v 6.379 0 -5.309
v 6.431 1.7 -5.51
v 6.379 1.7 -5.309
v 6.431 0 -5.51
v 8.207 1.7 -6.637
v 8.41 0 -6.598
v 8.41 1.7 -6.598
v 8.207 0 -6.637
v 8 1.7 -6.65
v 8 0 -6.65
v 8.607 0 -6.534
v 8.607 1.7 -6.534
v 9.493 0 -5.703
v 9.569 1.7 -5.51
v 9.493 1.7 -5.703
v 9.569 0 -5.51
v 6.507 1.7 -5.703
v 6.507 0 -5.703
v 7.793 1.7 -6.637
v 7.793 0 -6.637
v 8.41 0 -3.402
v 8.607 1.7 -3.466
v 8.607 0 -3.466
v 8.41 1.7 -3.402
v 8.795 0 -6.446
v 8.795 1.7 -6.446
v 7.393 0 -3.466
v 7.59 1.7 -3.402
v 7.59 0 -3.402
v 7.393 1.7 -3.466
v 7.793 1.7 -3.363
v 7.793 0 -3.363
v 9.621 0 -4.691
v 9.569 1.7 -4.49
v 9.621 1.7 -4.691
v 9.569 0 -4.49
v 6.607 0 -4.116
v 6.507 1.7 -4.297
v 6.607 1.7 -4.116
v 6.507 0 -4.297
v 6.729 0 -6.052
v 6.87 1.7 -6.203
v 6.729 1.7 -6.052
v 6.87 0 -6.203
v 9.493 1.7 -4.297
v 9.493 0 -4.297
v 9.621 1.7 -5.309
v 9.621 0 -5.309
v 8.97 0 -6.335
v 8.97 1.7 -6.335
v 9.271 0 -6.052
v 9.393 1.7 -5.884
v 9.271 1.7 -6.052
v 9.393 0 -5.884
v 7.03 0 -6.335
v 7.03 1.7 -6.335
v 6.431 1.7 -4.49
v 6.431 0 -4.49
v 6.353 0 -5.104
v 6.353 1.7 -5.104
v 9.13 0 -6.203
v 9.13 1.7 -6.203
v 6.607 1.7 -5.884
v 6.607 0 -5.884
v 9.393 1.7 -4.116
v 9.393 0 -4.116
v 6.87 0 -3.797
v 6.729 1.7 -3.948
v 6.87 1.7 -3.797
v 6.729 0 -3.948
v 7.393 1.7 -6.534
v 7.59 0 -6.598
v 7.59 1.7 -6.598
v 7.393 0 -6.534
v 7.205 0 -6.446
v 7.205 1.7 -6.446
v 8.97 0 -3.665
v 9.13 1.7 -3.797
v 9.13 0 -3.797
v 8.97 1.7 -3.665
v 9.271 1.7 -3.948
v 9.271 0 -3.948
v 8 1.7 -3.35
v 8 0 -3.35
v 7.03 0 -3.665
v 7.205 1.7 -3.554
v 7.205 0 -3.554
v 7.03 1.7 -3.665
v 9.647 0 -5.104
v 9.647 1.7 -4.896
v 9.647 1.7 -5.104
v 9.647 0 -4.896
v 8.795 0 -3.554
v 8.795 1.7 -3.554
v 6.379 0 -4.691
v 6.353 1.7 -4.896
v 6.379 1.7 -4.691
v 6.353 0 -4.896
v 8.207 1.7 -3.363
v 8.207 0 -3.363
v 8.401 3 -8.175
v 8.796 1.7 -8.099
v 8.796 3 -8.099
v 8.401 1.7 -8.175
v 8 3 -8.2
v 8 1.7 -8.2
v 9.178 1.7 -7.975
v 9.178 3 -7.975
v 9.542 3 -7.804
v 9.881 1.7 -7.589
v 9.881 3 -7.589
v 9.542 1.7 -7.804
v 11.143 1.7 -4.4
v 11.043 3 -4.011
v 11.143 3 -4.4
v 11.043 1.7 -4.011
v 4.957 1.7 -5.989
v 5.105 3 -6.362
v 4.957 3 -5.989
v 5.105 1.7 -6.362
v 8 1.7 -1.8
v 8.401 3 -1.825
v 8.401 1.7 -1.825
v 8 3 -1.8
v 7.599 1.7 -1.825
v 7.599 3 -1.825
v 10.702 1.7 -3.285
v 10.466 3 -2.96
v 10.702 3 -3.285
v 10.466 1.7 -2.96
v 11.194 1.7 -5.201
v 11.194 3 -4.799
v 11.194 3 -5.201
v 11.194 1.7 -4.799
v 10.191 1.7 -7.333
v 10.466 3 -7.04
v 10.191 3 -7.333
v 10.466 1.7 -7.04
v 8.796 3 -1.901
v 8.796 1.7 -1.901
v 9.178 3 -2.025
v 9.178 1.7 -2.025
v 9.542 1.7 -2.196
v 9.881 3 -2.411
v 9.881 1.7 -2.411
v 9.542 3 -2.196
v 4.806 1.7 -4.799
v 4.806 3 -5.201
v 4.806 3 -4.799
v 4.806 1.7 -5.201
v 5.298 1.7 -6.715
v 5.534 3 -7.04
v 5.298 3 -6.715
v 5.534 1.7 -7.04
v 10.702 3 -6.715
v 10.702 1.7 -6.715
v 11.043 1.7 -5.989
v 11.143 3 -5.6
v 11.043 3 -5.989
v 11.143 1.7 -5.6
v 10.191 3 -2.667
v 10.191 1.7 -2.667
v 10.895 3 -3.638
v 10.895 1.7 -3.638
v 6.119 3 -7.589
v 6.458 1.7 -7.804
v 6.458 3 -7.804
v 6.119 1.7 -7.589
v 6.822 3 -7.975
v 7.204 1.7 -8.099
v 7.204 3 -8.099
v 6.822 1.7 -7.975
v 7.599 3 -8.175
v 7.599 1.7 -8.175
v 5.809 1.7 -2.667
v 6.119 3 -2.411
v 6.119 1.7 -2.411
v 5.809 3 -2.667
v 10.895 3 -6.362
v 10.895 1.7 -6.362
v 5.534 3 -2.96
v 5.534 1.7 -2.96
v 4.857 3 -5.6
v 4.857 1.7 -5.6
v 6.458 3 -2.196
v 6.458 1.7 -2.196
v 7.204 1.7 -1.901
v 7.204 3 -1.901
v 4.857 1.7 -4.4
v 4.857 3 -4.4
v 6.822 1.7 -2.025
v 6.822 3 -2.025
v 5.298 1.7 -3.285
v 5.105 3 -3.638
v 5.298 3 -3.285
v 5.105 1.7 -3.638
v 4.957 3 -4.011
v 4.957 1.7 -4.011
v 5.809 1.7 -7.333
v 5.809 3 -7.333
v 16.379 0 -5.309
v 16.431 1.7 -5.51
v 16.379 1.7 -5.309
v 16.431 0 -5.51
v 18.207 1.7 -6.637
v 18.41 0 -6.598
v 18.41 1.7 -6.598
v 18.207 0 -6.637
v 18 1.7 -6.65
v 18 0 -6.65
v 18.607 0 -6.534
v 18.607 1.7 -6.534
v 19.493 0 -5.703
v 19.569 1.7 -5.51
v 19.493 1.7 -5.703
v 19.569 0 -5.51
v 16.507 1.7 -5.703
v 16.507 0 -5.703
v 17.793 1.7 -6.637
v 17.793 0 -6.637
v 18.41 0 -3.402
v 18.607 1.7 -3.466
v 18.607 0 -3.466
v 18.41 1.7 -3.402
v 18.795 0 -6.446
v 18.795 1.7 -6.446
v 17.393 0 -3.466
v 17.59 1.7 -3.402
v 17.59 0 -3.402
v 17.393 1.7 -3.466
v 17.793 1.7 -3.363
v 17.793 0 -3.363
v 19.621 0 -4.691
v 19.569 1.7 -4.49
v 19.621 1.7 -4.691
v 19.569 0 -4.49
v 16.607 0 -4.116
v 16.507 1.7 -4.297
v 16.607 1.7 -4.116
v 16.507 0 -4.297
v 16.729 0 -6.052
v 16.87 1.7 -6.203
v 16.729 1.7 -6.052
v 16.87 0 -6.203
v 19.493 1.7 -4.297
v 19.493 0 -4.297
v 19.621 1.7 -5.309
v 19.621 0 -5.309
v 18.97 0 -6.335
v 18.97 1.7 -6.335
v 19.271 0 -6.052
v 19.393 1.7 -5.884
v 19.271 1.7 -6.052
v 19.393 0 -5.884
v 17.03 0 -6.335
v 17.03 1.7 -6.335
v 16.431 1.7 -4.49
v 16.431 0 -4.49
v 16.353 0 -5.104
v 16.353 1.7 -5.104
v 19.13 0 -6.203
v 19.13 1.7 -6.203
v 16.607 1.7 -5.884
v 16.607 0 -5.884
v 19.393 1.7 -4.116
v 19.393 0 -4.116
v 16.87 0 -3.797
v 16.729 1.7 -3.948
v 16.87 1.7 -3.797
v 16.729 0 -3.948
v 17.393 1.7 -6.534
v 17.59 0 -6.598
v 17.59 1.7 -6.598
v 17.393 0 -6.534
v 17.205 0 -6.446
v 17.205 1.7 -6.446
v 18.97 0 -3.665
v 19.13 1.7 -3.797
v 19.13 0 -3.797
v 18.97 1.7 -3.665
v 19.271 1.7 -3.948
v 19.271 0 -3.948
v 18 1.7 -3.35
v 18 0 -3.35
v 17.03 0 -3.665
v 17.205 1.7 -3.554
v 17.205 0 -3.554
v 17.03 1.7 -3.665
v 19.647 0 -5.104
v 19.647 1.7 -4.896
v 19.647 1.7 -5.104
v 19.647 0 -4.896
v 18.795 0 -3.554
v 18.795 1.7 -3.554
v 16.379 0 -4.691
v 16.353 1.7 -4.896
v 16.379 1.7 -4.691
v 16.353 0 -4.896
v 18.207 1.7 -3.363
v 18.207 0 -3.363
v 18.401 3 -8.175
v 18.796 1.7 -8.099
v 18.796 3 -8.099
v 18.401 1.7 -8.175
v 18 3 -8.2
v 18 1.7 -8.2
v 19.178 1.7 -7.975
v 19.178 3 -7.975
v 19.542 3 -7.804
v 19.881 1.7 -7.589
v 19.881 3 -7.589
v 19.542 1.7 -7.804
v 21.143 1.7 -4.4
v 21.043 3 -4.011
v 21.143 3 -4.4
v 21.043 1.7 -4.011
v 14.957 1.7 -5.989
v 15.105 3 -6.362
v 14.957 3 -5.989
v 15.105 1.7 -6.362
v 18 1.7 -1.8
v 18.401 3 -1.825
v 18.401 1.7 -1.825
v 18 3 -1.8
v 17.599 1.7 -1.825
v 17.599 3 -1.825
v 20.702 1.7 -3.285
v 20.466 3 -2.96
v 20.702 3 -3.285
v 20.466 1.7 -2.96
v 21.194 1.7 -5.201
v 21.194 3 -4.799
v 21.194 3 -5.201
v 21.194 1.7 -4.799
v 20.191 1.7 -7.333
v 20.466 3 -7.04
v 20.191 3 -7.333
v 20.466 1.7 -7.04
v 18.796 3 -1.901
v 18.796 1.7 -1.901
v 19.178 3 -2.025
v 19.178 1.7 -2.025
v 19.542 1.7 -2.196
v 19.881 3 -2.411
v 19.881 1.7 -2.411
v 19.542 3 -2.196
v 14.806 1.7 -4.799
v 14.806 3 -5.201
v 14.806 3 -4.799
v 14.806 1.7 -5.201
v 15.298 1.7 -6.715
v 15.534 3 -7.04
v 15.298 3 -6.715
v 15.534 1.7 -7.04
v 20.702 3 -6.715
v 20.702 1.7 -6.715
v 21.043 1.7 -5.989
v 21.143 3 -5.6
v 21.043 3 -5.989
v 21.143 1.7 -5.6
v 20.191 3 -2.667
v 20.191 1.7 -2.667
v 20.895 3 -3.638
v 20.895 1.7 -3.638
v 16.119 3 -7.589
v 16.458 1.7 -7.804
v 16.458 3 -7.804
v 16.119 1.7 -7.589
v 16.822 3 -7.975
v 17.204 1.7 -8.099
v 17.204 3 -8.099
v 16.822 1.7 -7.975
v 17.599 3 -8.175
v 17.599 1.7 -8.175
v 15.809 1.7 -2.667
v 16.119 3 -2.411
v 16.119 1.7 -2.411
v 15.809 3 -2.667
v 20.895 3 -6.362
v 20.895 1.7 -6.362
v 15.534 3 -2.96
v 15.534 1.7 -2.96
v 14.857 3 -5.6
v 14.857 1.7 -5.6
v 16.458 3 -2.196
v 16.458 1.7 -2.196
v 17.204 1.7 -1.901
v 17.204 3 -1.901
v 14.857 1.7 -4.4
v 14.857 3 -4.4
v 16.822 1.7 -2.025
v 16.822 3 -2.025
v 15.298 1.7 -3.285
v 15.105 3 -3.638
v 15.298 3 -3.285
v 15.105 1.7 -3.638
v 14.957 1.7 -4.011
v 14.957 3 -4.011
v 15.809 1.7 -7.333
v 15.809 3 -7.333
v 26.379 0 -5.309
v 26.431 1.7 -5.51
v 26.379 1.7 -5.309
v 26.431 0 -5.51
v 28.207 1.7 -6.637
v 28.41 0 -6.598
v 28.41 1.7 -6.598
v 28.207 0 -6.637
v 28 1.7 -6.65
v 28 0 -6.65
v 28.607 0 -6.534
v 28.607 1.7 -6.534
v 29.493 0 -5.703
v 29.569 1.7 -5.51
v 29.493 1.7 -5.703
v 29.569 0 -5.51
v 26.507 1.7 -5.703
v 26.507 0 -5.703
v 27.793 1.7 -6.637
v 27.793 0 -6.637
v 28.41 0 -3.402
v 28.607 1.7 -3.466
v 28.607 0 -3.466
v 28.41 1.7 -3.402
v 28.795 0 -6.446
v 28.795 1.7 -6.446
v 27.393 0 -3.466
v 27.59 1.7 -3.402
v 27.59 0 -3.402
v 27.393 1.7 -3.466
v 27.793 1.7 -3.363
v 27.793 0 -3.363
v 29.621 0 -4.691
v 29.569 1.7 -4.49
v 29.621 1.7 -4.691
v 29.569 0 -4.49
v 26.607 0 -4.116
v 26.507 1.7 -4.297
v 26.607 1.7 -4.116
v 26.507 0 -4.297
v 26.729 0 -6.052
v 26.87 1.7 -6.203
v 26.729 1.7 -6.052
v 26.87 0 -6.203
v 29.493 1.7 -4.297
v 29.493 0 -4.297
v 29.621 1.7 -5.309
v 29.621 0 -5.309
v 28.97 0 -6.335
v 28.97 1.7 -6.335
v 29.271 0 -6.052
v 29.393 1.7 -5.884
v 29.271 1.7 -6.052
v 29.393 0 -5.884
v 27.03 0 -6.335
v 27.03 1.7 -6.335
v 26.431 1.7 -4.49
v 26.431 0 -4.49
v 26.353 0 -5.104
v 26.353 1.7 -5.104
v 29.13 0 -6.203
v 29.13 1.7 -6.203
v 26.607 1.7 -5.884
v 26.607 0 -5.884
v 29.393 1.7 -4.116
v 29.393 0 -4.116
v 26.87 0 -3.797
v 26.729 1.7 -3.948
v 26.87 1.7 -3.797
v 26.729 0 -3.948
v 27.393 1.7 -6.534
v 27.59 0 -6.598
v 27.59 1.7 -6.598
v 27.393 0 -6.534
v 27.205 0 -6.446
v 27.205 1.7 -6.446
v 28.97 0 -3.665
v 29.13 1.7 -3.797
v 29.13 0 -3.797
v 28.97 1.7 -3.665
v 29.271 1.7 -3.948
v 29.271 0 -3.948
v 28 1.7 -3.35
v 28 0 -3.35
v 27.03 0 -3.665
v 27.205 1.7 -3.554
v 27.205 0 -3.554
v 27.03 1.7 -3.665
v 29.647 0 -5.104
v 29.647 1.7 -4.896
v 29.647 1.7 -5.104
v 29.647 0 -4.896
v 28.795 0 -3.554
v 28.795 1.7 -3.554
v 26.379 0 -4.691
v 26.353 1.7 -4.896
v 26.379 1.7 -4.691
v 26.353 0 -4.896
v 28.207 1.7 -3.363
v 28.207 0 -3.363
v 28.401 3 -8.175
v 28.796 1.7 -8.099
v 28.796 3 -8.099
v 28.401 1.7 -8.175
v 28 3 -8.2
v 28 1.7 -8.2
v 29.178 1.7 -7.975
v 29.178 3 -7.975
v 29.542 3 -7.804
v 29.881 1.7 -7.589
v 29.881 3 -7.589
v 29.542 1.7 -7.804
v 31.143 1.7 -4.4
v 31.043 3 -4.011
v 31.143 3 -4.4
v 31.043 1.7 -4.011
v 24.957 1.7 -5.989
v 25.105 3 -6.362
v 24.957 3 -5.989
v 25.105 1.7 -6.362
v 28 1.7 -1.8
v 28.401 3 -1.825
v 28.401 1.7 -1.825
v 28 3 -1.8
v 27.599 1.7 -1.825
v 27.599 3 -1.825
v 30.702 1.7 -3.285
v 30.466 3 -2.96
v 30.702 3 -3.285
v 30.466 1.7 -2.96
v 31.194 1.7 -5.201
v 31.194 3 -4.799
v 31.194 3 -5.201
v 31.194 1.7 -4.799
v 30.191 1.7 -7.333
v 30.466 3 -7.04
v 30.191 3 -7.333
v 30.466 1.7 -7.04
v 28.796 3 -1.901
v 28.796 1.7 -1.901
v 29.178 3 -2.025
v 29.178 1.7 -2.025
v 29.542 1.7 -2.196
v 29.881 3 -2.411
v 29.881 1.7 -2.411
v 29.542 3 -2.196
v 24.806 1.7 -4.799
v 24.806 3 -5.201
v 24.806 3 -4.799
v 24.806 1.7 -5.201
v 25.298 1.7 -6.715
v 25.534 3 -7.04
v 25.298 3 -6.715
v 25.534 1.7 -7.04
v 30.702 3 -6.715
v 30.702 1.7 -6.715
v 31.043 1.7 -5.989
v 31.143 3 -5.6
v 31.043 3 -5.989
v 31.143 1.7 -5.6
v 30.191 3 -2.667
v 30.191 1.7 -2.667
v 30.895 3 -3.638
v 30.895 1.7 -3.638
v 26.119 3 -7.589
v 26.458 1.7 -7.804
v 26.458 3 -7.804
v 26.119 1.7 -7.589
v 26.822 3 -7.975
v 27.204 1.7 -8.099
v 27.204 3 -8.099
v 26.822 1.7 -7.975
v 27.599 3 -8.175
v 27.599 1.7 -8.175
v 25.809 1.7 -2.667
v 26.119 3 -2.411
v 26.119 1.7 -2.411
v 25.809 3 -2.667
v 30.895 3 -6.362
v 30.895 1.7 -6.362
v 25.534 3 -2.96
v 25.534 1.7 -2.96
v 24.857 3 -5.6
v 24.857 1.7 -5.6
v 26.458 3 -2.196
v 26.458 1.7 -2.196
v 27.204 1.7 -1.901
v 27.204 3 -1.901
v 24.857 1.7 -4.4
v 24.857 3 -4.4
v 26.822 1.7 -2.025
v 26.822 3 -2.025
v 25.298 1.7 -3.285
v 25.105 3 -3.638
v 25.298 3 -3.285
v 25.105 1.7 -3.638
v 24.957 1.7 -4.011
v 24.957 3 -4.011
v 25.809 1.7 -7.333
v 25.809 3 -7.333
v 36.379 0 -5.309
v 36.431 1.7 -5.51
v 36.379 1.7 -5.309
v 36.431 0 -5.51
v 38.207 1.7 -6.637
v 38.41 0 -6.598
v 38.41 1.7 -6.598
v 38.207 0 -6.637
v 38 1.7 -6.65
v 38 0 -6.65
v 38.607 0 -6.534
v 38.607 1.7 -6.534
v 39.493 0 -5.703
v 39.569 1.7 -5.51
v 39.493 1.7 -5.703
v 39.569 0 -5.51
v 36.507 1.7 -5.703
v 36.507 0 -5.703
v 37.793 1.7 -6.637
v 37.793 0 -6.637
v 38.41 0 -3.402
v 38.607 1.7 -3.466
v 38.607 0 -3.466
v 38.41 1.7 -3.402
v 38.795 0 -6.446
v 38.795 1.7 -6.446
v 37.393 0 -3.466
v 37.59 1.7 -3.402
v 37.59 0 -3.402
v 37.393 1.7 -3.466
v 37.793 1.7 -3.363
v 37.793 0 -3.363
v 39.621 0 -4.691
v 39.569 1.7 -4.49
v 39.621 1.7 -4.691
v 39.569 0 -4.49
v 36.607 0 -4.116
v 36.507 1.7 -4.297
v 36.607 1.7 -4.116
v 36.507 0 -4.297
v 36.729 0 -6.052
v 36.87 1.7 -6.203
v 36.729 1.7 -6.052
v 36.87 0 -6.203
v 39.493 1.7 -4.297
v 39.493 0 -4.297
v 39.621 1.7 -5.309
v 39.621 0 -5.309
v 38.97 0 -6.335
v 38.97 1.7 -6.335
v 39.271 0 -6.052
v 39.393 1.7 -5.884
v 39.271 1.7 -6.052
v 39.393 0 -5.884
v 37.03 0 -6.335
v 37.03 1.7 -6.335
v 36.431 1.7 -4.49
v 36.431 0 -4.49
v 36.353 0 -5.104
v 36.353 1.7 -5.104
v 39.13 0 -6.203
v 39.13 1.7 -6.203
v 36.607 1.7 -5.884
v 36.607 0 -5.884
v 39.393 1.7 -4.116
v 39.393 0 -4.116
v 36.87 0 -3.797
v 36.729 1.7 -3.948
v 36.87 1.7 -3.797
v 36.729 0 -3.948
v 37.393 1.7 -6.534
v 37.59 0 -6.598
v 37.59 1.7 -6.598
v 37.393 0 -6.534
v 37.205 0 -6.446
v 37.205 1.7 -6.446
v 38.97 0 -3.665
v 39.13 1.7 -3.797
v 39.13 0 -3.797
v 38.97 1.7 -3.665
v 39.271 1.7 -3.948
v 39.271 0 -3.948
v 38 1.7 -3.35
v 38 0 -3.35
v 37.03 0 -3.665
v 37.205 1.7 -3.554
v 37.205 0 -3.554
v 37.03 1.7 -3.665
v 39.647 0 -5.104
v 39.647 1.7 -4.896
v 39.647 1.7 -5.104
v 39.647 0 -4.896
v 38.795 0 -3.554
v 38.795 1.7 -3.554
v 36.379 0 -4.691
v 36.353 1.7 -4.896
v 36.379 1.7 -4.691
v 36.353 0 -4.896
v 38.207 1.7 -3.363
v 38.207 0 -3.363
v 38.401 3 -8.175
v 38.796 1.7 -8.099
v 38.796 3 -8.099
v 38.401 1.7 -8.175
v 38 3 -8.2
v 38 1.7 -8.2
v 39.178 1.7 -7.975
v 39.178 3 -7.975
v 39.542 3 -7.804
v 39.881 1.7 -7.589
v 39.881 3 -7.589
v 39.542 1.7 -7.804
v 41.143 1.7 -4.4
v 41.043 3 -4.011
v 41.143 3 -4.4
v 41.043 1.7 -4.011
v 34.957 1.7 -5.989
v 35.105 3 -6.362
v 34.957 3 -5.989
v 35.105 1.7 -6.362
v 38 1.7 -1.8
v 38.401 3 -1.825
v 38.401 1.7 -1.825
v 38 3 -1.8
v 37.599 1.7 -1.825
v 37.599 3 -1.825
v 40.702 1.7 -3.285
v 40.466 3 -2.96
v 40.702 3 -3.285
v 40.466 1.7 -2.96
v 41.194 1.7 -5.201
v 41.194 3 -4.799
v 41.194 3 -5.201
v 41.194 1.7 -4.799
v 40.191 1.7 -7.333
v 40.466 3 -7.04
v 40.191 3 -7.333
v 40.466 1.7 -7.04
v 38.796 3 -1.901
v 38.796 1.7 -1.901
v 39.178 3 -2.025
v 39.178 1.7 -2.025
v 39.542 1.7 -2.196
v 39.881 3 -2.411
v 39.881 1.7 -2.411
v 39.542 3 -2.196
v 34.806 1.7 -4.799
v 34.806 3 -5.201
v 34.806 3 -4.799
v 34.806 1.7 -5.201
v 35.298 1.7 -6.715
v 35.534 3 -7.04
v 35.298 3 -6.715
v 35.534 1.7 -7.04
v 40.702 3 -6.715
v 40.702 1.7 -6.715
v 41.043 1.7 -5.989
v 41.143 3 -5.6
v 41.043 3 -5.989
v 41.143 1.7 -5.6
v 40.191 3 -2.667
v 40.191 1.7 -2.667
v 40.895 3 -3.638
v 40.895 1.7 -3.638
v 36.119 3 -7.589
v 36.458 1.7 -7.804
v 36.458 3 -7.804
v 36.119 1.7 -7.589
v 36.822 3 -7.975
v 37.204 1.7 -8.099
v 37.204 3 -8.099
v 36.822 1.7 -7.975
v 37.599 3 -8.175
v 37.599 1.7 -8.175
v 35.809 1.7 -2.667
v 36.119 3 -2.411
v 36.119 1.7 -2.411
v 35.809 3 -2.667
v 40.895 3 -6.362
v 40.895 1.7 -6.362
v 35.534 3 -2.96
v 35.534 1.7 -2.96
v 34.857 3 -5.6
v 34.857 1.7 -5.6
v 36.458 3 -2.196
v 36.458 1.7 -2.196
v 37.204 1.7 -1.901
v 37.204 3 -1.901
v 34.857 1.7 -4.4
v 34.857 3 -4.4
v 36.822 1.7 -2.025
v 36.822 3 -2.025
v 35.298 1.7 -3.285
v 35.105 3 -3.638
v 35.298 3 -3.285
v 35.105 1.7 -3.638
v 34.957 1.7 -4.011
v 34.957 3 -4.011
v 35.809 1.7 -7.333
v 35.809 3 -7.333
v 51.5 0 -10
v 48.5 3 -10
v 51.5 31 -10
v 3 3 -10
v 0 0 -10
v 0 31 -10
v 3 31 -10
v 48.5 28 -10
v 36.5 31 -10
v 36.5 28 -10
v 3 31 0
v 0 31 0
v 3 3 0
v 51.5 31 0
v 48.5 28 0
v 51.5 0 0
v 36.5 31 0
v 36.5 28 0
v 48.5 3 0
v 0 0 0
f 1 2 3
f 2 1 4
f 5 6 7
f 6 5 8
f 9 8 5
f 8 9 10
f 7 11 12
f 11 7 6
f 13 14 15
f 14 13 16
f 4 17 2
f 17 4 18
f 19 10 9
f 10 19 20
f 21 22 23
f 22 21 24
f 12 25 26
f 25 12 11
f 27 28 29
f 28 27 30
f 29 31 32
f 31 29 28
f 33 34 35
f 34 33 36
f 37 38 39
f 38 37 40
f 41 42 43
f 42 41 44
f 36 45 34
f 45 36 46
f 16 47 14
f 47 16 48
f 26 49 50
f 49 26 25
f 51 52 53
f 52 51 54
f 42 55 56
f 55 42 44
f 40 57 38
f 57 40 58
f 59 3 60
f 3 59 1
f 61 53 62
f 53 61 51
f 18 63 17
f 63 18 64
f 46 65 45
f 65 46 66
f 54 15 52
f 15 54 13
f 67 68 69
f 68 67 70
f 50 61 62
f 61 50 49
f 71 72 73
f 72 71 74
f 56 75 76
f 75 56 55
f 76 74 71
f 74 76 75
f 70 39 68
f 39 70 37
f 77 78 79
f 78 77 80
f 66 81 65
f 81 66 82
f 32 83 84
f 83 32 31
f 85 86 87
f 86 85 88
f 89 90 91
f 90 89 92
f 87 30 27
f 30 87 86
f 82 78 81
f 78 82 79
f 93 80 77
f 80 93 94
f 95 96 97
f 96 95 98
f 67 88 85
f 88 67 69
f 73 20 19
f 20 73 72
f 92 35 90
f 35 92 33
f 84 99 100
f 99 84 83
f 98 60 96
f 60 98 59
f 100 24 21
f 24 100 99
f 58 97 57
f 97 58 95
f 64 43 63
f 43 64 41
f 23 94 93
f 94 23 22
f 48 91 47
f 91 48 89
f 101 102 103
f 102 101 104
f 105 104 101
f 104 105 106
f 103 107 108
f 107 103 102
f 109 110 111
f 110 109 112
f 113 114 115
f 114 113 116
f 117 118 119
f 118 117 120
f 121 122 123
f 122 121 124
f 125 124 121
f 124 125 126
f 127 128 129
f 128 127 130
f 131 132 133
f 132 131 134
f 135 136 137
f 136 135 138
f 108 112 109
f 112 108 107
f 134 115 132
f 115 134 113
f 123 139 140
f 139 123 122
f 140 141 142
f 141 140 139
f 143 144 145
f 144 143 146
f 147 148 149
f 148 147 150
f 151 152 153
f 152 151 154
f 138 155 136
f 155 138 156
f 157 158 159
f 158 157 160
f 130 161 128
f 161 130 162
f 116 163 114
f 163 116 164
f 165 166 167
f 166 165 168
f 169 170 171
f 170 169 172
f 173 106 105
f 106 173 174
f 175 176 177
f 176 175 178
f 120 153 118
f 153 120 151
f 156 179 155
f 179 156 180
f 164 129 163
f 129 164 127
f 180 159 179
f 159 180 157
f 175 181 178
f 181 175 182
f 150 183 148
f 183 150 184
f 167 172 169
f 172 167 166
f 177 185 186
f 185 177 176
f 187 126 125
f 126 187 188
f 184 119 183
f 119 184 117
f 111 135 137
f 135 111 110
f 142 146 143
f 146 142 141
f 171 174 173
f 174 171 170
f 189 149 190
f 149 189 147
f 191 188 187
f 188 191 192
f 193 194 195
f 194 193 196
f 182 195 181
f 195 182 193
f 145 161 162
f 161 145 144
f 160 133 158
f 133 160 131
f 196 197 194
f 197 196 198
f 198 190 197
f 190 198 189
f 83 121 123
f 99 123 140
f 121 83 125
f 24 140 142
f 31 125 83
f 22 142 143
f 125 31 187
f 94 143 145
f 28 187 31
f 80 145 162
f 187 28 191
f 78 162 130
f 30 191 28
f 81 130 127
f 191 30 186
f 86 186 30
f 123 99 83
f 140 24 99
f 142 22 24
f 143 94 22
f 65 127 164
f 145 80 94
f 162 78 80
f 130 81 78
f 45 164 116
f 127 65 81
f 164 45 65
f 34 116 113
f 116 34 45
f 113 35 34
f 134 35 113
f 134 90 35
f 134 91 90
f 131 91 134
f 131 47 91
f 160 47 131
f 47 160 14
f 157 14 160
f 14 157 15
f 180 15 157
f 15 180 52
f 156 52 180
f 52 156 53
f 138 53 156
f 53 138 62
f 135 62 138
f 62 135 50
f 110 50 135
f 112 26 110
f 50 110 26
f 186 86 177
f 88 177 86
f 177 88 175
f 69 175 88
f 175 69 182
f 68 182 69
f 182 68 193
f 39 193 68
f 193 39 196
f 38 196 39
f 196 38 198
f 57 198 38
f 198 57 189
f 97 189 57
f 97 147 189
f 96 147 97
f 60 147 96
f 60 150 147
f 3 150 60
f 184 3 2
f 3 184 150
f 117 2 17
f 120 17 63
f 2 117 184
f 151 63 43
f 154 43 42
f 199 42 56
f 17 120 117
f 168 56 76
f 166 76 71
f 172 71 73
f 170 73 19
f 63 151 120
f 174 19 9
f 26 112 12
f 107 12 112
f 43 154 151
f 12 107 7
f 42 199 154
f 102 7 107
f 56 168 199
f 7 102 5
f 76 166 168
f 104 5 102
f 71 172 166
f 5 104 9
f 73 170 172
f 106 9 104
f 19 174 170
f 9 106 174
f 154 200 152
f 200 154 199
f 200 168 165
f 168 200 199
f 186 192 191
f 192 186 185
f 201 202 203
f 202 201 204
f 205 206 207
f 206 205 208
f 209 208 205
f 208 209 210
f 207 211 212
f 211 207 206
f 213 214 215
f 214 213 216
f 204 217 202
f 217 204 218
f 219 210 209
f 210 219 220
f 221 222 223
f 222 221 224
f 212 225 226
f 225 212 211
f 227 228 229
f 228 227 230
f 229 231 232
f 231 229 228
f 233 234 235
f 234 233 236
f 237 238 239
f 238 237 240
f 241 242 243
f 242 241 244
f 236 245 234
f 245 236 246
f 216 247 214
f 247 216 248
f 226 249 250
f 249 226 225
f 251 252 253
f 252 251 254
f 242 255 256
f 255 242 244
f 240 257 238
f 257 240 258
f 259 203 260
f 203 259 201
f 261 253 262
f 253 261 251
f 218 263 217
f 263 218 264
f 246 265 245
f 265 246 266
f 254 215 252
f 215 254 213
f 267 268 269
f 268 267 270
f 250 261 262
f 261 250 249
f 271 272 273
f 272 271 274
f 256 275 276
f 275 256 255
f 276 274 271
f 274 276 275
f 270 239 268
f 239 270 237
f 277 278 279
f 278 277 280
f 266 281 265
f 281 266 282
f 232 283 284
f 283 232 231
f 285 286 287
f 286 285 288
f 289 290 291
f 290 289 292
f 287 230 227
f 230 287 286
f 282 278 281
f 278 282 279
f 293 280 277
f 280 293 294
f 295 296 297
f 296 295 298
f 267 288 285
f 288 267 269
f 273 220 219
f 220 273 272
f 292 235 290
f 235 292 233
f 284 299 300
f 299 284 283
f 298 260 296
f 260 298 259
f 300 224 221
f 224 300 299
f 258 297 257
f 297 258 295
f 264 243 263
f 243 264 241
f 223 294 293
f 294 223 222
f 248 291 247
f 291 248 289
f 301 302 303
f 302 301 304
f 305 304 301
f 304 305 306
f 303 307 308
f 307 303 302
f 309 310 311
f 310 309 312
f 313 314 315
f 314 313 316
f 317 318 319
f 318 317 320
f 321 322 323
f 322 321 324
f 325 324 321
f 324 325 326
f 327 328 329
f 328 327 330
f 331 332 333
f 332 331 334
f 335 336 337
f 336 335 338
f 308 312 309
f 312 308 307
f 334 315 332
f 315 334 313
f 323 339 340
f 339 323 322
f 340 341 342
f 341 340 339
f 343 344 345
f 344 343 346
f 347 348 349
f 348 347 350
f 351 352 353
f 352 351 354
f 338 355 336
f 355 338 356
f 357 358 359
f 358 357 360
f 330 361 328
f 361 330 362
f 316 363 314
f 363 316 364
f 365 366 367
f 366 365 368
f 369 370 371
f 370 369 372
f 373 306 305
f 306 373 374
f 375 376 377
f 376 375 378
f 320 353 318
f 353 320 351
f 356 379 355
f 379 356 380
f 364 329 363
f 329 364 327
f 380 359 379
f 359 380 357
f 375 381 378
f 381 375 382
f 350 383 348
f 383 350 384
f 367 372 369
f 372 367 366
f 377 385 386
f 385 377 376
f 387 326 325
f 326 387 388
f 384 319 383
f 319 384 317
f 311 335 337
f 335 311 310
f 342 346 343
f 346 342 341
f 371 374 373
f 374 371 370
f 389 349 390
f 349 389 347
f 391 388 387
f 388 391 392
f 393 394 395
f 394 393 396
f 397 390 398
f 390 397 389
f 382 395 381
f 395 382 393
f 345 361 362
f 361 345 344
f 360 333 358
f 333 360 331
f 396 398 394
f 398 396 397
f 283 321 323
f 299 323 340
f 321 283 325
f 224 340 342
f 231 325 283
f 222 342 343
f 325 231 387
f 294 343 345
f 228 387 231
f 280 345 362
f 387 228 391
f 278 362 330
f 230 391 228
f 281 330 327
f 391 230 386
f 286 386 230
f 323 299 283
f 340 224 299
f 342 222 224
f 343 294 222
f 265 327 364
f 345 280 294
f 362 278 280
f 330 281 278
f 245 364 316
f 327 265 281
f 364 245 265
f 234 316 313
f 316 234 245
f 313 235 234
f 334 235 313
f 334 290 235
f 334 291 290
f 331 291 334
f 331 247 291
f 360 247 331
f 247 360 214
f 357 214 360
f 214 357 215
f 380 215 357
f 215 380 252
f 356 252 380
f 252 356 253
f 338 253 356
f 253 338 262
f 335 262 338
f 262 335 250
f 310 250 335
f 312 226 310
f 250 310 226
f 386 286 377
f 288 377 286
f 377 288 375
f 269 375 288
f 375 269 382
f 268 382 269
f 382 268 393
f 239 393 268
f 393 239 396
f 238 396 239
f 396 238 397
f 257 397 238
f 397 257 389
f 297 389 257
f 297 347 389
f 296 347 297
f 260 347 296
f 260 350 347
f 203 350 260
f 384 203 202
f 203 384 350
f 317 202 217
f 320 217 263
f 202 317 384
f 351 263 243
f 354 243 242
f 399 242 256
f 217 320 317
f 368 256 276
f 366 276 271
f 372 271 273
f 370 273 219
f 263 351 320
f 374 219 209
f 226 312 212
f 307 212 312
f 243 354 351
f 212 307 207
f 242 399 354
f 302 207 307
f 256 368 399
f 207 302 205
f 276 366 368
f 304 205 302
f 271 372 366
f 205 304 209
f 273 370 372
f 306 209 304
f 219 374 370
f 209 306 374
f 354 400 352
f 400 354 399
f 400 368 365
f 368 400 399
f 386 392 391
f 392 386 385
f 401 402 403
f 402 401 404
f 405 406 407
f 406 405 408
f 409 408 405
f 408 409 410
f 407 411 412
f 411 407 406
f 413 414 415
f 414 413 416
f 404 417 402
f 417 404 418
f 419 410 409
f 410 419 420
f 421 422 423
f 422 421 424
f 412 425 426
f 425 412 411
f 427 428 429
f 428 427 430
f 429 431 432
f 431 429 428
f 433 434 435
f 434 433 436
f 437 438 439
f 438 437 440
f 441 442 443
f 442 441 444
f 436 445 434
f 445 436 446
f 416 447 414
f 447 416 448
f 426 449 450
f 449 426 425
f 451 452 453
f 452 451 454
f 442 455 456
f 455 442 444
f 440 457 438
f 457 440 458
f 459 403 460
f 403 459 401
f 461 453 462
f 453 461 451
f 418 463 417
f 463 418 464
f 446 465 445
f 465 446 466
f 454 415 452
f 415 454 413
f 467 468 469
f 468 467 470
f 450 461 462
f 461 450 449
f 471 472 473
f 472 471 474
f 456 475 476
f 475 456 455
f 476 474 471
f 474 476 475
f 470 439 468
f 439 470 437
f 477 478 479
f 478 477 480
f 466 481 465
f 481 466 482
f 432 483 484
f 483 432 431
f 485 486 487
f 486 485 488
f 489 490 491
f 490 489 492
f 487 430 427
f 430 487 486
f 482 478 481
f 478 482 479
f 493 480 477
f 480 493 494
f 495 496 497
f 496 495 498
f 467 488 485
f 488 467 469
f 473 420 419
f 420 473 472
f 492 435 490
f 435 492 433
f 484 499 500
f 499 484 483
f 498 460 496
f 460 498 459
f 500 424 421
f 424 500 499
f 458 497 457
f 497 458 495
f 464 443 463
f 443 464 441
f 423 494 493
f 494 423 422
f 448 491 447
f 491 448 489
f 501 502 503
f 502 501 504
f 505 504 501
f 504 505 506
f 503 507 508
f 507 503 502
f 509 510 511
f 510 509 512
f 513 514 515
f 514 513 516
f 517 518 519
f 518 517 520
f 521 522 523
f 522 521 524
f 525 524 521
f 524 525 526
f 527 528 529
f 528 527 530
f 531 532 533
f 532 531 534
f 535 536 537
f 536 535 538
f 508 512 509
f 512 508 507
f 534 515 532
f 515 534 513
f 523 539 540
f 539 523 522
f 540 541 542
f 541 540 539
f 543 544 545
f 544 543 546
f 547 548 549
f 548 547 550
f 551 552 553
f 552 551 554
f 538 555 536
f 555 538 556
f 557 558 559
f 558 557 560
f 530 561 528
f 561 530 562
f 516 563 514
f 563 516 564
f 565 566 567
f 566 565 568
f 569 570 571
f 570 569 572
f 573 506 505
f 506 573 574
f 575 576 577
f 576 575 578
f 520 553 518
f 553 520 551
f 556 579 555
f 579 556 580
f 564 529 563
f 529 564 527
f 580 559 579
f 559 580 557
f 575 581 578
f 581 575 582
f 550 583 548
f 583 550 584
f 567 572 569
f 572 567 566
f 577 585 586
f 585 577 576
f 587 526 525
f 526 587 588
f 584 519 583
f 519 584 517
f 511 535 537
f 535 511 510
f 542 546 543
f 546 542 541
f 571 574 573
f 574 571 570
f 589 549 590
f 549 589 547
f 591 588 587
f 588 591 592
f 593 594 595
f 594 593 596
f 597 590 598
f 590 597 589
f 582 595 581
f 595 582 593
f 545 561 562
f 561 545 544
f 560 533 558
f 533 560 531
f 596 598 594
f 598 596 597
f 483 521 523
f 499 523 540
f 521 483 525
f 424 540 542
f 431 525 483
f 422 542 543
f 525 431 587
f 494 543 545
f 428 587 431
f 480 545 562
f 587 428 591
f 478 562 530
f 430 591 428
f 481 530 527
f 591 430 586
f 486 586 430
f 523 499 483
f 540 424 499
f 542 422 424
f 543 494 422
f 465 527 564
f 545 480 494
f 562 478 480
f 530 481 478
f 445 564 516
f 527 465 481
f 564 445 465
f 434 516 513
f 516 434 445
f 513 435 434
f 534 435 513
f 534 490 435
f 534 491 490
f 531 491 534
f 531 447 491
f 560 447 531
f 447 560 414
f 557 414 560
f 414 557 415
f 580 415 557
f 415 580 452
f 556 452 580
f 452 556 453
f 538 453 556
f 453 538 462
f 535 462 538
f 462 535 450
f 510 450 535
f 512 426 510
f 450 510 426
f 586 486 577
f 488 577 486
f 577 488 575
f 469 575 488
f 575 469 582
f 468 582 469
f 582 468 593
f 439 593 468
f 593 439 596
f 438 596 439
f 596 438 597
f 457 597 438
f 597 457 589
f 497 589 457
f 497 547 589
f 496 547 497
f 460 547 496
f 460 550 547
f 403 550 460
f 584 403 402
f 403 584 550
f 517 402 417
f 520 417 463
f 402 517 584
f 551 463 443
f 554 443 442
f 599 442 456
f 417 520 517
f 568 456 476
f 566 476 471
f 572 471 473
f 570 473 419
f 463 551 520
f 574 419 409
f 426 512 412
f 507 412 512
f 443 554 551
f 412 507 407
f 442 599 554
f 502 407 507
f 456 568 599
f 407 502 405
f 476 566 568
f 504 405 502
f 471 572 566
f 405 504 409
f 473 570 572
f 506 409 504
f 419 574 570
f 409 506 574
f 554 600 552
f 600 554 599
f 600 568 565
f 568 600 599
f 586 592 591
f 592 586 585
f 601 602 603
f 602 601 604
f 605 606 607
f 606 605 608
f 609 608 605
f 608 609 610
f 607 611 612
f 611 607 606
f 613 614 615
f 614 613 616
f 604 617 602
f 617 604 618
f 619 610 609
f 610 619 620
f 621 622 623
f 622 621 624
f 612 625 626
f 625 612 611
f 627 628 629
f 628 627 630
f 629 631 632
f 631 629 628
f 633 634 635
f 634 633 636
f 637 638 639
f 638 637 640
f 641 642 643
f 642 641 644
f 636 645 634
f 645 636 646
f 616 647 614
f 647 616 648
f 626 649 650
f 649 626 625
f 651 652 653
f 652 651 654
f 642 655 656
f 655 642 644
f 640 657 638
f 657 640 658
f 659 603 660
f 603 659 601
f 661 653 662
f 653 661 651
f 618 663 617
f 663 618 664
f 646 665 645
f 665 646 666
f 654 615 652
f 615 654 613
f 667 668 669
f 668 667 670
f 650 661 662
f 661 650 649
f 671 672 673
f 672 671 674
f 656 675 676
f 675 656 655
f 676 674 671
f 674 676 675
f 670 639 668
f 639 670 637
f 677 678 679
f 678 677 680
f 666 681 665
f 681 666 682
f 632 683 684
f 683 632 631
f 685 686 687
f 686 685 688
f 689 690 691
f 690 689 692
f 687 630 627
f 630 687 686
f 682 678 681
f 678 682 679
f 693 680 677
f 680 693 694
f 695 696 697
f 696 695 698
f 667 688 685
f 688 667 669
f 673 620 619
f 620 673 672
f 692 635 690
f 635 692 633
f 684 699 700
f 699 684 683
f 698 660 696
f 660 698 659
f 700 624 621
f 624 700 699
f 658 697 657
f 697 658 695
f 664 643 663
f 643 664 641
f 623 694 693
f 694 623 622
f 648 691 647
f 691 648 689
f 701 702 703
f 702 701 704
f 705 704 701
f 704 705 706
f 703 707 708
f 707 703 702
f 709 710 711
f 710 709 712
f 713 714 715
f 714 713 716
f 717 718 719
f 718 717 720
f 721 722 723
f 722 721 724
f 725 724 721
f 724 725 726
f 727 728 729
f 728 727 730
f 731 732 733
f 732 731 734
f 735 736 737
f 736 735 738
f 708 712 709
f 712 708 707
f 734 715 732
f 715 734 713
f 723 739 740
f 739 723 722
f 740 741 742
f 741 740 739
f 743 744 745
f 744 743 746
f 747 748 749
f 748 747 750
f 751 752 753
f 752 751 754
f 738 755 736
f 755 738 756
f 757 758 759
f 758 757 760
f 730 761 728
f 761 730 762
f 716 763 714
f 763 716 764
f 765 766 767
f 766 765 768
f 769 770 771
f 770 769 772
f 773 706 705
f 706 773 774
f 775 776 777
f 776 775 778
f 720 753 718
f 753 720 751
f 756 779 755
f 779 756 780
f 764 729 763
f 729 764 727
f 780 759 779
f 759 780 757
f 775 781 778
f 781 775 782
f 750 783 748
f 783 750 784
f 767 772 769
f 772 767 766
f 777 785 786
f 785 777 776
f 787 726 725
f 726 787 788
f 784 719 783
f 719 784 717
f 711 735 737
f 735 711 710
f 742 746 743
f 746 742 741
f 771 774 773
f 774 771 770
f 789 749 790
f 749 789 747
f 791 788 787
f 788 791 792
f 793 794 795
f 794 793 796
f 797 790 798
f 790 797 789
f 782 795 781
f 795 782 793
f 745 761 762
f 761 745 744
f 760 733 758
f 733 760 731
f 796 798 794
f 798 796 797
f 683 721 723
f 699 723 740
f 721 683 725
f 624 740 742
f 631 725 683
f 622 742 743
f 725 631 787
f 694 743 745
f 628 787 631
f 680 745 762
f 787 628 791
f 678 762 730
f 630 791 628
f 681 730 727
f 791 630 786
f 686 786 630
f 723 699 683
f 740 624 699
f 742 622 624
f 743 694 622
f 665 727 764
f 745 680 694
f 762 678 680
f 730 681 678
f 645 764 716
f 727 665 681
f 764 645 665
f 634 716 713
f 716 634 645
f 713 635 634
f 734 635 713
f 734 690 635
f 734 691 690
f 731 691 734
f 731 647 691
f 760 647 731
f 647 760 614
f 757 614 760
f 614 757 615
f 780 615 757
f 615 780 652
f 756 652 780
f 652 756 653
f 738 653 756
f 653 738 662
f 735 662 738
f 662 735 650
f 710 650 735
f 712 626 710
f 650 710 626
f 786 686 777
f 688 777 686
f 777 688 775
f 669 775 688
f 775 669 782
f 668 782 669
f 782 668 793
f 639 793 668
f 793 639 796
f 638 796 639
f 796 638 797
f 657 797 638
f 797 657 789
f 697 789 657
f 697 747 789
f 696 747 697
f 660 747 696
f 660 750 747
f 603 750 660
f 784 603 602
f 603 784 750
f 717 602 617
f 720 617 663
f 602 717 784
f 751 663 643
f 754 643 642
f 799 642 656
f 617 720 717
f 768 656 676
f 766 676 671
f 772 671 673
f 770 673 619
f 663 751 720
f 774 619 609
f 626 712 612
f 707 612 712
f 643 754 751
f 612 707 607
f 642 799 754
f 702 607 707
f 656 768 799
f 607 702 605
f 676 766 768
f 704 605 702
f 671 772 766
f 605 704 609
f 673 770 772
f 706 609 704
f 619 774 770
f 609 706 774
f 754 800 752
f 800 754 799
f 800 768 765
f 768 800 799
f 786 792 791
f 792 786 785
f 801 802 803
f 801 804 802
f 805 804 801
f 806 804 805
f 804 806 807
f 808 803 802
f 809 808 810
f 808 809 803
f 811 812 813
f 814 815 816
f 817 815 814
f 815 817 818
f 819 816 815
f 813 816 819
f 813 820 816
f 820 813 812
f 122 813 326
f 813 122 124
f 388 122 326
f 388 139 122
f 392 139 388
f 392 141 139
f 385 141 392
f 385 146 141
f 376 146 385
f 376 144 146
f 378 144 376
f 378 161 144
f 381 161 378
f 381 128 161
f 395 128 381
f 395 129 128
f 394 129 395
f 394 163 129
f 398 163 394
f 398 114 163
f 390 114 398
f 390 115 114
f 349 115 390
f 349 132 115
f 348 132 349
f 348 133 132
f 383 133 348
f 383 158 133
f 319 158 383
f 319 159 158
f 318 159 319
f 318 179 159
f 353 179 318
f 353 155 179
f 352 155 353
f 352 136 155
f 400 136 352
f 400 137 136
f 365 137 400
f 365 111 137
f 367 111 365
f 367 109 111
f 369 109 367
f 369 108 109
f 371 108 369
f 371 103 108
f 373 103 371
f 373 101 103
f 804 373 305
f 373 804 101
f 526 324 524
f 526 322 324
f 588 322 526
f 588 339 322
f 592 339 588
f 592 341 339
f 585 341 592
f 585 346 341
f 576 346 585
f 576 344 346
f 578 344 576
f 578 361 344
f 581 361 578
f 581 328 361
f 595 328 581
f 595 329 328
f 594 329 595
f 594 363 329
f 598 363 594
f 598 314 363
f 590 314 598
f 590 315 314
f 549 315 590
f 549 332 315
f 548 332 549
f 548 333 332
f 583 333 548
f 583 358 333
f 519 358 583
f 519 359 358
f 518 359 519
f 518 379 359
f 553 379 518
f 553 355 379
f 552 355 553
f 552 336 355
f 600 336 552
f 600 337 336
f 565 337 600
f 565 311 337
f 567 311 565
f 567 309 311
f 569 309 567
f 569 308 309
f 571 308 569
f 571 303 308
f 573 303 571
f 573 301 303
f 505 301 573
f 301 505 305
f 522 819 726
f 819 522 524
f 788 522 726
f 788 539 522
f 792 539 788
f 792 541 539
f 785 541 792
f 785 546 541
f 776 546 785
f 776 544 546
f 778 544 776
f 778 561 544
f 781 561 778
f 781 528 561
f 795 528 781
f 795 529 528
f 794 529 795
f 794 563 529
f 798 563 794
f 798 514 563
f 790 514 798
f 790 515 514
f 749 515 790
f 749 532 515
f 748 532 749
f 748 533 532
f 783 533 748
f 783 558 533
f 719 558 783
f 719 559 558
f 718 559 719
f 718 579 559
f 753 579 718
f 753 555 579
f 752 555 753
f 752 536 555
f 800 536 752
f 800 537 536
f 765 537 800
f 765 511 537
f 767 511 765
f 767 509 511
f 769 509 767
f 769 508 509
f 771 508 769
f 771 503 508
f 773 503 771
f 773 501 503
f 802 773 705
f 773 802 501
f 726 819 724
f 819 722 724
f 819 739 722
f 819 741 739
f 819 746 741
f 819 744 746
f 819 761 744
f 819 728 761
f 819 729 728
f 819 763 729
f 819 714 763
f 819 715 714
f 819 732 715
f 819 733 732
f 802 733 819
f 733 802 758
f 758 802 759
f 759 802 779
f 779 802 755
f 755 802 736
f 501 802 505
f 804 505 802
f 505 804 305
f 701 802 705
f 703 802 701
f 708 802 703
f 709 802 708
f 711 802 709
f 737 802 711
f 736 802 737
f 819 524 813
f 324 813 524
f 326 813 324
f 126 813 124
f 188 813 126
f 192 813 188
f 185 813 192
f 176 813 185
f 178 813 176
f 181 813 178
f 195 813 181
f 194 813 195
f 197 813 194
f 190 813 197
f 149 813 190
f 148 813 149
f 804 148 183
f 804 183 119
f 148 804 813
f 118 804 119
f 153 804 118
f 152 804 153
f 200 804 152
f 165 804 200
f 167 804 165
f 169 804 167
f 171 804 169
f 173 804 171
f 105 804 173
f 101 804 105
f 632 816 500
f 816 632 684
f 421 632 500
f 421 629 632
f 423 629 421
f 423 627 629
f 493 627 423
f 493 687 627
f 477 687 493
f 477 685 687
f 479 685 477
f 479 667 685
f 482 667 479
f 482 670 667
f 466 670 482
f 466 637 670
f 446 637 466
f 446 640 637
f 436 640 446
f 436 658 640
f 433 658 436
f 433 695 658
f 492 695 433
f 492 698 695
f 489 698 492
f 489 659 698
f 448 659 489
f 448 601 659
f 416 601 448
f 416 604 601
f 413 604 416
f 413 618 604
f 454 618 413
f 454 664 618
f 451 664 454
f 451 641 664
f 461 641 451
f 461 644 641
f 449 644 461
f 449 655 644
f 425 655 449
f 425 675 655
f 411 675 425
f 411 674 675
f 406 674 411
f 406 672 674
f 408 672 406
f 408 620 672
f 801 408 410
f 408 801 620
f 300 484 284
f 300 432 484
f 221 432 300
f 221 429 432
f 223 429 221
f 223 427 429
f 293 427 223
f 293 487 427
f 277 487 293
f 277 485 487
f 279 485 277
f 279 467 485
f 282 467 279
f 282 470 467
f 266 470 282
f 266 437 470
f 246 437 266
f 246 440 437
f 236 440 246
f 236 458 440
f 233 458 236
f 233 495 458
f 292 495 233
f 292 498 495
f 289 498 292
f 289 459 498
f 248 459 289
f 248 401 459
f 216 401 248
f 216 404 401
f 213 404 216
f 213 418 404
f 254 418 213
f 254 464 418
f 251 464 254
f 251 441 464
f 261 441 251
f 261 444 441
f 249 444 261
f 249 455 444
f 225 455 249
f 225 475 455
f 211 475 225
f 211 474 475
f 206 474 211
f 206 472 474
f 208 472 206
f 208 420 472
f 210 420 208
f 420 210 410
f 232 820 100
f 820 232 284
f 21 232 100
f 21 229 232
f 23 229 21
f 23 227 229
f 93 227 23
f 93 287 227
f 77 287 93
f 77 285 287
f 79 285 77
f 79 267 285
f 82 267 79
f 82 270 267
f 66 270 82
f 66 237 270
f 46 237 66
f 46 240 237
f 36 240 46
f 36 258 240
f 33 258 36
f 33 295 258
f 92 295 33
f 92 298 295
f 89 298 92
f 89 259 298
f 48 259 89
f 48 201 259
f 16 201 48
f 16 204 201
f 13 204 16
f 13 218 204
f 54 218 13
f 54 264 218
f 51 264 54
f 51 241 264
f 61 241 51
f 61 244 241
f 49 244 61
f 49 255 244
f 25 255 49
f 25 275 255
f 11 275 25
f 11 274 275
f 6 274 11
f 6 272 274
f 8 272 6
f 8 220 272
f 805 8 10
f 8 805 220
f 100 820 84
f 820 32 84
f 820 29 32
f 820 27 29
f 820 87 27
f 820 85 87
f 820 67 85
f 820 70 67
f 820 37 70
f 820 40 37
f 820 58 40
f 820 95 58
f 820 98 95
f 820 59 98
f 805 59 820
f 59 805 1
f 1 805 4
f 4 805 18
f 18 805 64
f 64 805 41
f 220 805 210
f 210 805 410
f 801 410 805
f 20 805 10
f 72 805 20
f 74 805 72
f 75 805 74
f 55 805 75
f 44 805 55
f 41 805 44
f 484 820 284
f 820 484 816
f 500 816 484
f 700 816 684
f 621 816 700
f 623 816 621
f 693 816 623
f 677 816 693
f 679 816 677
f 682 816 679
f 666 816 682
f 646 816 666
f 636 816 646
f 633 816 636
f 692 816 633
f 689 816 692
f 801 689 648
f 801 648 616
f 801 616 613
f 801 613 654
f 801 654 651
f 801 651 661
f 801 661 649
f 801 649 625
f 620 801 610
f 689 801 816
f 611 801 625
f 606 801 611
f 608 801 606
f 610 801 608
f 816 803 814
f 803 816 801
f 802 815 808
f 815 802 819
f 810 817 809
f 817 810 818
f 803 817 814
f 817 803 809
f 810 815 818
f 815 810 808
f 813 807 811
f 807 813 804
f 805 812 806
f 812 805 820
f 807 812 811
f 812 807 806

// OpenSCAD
fit=0.2;
width=10;
thick=3;
inner_height=45.5;
inner_depth=25;
hook_size=12;
screw_head_diameter=6.0;
screw_head_thick=2.8;
screw_diameter=2.9;
screw_head_round=true;

height=inner_height+2*thick;
depth=inner_depth+2*thick;

front=[width,thick,inner_height];
top=[width,inner_depth,thick];
hook=[width,thick,hook_size];
fill=[width,thick,thick];

rotate([0,90,0]){
    union(){
        translate([0,0,thick]){
            difference(){
                cube(front);
                screw(5);
                screw(15);
                screw(25);
                screw(35);
            }
            translate([0,thick,inner_height]){
                cube(top);
                translate([0,top.y,-hook_size])
                    cube(hook);
            }
            translate([0,thick,-thick]){
                cube(top);
            }
        }

        translate([0,0,0]) cube(fill);
        translate([0,0,height-thick]) cube(fill);
        translate([0,depth-thick,0]) cube(fill);
        translate([0,depth-thick,height-thick]) cube(fill);
        
    }
}
module screw(pos){
    rotate([90,0,0]){
        translate([width/2,pos,-(1.5*thick)]){
            cylinder(r=screw_diameter/2+fit,h=thick*2,$fn=50);
            if(screw_head_round==false){
                cylinder(r=screw_head_diameter/2+fit,h=screw_head_thick,$fn=6);
            }else{
                cylinder(r=screw_head_diameter/2+fit,h=screw_head_thick,$fn=50);                 
            }
        }
    }
}
